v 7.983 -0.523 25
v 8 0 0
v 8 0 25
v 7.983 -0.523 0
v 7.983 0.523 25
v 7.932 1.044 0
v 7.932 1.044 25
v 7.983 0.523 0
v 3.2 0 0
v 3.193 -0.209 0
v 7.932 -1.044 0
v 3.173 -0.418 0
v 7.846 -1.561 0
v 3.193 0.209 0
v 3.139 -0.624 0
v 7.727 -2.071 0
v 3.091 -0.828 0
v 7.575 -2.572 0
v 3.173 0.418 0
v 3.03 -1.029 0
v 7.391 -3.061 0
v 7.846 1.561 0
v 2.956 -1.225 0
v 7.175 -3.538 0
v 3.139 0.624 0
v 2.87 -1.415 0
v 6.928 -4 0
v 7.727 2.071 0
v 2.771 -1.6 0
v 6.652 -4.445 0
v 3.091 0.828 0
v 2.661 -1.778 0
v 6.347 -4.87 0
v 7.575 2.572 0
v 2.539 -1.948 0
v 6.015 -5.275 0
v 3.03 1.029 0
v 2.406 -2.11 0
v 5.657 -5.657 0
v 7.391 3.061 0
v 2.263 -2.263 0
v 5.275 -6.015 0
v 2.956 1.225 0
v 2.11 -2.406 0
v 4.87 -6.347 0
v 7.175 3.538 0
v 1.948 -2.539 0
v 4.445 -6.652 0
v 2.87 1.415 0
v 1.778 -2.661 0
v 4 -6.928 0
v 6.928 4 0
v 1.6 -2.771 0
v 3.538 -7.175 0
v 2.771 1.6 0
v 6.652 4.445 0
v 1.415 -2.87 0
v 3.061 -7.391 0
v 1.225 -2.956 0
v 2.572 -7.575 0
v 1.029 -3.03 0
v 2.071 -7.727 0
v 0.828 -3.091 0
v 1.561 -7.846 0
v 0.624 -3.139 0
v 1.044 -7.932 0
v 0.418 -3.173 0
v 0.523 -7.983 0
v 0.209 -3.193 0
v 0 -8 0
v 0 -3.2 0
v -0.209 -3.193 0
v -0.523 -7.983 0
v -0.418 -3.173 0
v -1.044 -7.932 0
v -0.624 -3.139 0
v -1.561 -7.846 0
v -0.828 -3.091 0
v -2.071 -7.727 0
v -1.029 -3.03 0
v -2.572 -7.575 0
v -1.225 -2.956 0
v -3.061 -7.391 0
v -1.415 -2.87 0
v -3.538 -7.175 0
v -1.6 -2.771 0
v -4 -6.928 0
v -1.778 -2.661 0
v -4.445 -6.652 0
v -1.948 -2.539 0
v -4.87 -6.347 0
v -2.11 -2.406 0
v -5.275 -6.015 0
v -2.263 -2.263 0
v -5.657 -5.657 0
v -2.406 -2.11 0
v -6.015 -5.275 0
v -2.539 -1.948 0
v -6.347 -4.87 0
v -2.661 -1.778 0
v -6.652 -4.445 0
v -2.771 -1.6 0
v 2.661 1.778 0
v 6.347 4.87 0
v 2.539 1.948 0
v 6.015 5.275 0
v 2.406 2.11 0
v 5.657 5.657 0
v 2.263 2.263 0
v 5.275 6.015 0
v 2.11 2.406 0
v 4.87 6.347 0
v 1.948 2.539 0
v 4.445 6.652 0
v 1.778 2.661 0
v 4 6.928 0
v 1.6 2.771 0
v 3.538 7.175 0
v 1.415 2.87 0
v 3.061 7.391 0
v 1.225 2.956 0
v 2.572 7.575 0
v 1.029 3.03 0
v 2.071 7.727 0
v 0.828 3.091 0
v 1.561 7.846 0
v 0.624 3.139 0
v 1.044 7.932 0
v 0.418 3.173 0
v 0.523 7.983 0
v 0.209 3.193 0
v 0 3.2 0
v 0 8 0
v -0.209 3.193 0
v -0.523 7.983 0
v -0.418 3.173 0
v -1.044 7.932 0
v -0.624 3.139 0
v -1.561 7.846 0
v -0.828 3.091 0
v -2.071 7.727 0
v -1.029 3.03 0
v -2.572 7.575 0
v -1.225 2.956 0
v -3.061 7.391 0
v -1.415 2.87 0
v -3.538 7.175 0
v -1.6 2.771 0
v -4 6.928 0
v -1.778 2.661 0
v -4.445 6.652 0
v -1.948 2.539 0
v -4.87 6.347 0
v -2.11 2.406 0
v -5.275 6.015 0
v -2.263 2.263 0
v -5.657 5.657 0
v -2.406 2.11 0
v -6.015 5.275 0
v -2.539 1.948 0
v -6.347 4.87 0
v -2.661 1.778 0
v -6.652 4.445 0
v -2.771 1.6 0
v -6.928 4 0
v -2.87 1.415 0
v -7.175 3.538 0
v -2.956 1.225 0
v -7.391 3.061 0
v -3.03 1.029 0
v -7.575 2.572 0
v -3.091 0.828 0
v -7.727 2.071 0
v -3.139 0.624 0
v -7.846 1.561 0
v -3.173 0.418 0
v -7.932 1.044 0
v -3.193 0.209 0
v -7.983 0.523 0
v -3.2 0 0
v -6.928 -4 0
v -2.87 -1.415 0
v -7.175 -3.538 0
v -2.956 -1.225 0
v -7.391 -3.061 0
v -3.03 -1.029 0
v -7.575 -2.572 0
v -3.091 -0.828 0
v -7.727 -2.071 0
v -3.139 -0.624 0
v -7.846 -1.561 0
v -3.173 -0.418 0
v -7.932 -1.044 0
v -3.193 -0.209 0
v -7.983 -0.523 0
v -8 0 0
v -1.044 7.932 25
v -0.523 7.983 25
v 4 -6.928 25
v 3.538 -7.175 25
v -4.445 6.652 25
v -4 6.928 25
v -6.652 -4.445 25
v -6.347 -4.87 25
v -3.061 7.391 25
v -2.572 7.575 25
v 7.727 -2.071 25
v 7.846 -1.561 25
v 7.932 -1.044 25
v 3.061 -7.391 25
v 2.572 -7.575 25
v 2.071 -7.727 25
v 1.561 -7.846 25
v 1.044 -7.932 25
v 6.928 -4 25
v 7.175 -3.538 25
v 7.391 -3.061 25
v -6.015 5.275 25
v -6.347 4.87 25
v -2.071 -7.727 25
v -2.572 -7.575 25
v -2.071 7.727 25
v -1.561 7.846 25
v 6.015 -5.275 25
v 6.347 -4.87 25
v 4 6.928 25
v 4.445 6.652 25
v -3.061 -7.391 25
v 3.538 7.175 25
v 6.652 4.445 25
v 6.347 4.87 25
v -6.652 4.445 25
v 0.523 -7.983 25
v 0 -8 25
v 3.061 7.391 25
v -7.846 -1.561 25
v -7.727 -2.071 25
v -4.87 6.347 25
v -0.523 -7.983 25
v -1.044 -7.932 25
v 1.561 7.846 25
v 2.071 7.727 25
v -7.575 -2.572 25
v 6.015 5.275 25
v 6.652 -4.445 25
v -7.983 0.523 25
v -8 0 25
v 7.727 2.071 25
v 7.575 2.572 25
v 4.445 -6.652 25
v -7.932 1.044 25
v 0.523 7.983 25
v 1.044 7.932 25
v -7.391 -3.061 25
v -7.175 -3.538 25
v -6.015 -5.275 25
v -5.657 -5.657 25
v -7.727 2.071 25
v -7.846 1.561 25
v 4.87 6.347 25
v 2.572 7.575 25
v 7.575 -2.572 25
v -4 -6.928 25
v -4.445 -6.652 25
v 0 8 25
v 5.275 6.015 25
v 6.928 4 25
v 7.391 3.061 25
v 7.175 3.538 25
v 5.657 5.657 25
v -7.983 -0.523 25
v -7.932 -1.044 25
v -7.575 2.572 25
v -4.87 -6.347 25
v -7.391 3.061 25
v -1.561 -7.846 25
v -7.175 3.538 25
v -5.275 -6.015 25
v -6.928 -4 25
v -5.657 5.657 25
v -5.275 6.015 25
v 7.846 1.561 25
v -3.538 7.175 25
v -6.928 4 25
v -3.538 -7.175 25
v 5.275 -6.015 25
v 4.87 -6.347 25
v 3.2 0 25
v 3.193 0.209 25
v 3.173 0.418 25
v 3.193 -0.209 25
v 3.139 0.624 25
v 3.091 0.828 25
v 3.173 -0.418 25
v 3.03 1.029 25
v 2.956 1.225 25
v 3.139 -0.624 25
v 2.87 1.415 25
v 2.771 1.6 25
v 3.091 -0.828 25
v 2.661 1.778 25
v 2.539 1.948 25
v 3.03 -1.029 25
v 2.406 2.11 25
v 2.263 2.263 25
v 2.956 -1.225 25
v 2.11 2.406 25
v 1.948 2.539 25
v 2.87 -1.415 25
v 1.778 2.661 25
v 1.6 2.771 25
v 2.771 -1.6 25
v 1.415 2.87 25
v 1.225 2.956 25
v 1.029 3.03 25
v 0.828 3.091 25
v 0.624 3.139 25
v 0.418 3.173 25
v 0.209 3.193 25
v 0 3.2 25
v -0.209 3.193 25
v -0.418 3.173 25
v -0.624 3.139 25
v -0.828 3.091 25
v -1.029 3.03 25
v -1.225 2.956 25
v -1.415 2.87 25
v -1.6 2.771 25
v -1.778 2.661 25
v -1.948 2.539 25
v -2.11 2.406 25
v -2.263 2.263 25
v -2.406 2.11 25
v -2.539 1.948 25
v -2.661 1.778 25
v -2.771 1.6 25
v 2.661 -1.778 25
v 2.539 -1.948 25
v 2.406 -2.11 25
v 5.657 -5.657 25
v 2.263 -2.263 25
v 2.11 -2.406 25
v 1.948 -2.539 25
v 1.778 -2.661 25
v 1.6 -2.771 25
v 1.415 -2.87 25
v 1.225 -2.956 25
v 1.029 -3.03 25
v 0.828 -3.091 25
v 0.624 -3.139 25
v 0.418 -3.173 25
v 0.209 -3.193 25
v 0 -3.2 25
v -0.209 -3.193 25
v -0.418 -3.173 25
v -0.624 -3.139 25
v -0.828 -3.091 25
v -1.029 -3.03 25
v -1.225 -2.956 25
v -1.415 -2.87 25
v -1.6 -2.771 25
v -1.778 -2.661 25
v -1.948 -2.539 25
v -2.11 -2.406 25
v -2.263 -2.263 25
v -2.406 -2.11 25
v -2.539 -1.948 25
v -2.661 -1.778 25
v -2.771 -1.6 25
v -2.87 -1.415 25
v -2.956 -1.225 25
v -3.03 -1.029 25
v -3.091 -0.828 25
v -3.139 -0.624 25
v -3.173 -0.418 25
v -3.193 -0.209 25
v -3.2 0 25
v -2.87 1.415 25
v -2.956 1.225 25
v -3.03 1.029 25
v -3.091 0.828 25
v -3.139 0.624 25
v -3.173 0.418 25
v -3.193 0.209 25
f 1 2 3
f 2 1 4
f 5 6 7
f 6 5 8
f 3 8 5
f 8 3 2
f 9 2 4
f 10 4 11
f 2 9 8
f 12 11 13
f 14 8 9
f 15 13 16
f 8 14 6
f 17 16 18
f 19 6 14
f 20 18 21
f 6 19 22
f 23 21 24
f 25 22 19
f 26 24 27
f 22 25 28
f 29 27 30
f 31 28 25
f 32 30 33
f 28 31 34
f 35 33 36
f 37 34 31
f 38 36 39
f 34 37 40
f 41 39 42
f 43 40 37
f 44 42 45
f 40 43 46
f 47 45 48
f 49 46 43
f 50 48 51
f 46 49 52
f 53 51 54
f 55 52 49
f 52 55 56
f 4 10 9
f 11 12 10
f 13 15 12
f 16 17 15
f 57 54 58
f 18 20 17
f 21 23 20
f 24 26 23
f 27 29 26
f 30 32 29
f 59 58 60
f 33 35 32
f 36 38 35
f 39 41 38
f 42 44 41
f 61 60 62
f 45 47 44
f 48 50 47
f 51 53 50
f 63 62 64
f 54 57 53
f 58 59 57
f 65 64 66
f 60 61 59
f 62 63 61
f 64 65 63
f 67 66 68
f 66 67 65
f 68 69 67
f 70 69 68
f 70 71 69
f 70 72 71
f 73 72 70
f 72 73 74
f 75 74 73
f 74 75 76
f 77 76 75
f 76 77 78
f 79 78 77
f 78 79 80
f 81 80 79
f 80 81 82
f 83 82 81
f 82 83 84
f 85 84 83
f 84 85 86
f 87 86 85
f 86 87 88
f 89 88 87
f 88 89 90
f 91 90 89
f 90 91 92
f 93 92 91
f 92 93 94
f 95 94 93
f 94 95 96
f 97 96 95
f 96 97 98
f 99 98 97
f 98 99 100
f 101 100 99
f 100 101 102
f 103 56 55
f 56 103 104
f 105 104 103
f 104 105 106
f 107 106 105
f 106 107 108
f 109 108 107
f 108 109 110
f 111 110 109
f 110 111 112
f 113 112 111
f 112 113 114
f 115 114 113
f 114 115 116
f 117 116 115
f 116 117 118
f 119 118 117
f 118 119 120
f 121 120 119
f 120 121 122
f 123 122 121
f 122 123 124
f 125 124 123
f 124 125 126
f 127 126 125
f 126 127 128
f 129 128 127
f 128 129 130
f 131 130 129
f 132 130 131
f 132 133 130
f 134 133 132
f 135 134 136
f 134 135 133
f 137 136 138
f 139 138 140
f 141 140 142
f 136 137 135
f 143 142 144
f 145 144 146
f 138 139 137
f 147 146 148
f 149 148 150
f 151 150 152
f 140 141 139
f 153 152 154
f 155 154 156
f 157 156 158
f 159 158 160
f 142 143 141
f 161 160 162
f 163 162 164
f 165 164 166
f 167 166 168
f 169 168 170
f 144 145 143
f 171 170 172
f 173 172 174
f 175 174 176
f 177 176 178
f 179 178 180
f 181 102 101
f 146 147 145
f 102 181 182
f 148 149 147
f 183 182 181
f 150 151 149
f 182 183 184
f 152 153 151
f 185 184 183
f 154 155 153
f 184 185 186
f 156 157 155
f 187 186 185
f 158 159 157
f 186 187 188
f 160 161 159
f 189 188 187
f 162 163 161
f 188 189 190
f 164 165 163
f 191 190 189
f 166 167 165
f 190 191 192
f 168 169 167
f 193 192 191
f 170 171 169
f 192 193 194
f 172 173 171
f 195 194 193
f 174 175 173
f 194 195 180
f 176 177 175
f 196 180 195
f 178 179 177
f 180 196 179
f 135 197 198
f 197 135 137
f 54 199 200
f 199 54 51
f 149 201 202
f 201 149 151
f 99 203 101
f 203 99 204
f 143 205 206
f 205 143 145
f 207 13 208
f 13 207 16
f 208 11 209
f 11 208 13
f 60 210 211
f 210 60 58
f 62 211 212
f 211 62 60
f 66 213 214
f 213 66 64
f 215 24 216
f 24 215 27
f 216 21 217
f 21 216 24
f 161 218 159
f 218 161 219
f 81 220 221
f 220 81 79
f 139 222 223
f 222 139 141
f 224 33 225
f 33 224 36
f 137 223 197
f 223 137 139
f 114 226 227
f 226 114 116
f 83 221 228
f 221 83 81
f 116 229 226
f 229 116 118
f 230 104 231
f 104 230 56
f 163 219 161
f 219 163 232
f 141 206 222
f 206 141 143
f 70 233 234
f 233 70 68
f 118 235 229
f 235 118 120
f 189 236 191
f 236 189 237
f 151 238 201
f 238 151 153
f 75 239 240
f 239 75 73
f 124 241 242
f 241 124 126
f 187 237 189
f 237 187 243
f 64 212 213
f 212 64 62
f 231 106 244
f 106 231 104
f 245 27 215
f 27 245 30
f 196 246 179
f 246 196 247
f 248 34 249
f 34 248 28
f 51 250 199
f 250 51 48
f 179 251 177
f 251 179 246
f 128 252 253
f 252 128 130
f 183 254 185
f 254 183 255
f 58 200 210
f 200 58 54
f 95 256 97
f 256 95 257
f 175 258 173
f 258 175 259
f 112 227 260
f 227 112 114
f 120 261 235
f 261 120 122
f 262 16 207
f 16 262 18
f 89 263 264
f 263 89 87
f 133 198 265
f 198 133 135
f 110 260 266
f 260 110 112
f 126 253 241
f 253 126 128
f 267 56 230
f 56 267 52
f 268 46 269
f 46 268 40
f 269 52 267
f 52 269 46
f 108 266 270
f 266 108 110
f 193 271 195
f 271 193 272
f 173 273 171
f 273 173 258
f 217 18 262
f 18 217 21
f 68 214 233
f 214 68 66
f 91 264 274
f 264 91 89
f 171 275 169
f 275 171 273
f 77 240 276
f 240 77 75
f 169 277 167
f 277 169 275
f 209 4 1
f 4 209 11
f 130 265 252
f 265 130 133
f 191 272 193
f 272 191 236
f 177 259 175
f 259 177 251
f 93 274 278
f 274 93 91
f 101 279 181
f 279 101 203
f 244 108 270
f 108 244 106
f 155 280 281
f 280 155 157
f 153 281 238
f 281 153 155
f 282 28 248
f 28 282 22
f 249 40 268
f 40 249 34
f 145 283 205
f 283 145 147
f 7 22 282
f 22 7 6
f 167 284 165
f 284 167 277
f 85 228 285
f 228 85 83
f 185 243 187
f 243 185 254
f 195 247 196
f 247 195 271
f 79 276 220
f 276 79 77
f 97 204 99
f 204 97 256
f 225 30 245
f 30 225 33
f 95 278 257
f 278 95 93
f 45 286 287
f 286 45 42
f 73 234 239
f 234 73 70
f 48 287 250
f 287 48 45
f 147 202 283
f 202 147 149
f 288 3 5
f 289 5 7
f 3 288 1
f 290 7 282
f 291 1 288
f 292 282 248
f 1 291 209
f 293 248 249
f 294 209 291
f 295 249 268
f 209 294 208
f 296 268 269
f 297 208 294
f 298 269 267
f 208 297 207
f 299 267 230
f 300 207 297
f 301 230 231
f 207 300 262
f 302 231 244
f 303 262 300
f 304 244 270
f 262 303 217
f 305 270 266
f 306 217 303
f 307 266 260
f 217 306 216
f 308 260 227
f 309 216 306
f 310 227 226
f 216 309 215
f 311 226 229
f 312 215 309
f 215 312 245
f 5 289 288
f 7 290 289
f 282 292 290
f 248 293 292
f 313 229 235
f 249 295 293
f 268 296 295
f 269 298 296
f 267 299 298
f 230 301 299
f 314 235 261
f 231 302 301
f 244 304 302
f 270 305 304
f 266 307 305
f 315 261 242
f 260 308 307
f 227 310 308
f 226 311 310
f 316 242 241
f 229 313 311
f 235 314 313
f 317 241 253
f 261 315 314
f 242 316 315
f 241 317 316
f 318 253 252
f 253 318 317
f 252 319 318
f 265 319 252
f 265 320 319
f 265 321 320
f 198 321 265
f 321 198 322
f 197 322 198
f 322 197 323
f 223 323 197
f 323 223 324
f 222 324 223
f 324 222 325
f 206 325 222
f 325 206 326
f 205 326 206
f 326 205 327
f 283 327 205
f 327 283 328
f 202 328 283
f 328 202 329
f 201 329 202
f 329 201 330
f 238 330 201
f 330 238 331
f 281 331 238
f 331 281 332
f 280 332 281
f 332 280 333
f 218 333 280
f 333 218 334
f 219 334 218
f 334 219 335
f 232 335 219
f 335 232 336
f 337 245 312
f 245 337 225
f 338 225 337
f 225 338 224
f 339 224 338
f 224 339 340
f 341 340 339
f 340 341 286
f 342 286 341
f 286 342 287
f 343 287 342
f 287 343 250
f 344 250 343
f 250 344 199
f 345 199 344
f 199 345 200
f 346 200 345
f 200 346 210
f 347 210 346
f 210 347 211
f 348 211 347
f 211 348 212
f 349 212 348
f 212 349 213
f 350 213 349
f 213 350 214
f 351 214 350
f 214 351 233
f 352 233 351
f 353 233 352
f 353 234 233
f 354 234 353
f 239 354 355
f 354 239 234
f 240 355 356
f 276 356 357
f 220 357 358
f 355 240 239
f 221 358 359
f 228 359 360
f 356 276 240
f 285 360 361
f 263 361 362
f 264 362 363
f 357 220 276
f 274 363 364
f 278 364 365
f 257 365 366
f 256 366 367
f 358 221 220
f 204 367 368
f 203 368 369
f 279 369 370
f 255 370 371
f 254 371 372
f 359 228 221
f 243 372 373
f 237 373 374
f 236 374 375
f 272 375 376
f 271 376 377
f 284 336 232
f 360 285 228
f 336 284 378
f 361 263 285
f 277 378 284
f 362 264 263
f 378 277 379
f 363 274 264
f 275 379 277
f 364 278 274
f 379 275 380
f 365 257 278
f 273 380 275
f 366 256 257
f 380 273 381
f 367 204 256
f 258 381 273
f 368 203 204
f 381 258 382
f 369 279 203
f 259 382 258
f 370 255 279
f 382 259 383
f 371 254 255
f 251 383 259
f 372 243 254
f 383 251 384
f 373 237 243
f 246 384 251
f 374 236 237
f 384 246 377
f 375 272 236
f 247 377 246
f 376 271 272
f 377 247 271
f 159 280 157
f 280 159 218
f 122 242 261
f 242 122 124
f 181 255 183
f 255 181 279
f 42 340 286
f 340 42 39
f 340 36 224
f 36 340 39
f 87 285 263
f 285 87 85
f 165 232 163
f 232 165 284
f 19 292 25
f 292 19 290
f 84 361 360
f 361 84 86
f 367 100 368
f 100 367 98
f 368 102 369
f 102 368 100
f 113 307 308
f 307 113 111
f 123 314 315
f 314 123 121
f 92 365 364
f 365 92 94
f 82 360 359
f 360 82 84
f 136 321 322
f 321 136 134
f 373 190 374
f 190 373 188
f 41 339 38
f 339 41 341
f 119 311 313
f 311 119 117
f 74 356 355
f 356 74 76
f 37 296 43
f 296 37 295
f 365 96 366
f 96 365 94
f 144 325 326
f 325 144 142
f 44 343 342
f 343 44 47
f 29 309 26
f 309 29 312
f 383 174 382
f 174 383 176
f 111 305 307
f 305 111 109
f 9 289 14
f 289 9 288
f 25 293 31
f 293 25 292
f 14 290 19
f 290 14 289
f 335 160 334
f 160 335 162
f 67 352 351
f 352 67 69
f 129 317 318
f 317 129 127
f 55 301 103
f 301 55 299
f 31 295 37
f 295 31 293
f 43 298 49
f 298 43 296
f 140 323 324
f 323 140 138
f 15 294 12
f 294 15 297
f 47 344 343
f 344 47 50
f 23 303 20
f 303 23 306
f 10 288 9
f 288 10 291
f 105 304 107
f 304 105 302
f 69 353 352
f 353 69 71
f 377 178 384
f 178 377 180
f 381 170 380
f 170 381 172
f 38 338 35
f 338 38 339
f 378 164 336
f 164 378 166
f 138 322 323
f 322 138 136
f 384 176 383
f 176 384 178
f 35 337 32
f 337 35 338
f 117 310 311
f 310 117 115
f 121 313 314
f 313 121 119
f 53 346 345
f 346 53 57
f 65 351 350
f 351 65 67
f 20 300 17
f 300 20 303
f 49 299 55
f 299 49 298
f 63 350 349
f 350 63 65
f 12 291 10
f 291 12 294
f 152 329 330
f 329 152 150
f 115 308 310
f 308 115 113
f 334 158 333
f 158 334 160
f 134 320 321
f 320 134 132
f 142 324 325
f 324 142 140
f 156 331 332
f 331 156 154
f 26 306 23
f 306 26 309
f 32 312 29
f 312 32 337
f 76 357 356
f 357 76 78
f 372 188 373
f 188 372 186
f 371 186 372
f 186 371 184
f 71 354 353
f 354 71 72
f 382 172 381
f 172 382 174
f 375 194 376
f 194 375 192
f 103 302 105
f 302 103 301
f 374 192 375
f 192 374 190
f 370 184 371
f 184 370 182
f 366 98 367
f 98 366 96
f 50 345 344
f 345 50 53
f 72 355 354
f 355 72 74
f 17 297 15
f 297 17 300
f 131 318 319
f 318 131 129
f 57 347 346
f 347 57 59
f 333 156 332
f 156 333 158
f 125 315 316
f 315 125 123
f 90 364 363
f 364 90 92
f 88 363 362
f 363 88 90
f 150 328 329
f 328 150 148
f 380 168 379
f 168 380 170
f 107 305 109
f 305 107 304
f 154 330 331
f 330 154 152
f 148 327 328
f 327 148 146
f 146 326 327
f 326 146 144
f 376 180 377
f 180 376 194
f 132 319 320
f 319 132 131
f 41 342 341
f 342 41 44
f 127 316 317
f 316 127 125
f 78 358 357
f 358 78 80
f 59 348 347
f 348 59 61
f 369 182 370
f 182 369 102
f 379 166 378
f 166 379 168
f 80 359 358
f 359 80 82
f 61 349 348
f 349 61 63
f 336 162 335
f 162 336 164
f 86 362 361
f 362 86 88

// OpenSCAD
outer_diameter = 16; bore_diameter = 6.4; length = 25;
$fn = 96;
difference() {
  cylinder(d = outer_diameter, h = length);
  translate([0, 0, -1]) cylinder(d = bore_diameter, h = length + 2);
}
